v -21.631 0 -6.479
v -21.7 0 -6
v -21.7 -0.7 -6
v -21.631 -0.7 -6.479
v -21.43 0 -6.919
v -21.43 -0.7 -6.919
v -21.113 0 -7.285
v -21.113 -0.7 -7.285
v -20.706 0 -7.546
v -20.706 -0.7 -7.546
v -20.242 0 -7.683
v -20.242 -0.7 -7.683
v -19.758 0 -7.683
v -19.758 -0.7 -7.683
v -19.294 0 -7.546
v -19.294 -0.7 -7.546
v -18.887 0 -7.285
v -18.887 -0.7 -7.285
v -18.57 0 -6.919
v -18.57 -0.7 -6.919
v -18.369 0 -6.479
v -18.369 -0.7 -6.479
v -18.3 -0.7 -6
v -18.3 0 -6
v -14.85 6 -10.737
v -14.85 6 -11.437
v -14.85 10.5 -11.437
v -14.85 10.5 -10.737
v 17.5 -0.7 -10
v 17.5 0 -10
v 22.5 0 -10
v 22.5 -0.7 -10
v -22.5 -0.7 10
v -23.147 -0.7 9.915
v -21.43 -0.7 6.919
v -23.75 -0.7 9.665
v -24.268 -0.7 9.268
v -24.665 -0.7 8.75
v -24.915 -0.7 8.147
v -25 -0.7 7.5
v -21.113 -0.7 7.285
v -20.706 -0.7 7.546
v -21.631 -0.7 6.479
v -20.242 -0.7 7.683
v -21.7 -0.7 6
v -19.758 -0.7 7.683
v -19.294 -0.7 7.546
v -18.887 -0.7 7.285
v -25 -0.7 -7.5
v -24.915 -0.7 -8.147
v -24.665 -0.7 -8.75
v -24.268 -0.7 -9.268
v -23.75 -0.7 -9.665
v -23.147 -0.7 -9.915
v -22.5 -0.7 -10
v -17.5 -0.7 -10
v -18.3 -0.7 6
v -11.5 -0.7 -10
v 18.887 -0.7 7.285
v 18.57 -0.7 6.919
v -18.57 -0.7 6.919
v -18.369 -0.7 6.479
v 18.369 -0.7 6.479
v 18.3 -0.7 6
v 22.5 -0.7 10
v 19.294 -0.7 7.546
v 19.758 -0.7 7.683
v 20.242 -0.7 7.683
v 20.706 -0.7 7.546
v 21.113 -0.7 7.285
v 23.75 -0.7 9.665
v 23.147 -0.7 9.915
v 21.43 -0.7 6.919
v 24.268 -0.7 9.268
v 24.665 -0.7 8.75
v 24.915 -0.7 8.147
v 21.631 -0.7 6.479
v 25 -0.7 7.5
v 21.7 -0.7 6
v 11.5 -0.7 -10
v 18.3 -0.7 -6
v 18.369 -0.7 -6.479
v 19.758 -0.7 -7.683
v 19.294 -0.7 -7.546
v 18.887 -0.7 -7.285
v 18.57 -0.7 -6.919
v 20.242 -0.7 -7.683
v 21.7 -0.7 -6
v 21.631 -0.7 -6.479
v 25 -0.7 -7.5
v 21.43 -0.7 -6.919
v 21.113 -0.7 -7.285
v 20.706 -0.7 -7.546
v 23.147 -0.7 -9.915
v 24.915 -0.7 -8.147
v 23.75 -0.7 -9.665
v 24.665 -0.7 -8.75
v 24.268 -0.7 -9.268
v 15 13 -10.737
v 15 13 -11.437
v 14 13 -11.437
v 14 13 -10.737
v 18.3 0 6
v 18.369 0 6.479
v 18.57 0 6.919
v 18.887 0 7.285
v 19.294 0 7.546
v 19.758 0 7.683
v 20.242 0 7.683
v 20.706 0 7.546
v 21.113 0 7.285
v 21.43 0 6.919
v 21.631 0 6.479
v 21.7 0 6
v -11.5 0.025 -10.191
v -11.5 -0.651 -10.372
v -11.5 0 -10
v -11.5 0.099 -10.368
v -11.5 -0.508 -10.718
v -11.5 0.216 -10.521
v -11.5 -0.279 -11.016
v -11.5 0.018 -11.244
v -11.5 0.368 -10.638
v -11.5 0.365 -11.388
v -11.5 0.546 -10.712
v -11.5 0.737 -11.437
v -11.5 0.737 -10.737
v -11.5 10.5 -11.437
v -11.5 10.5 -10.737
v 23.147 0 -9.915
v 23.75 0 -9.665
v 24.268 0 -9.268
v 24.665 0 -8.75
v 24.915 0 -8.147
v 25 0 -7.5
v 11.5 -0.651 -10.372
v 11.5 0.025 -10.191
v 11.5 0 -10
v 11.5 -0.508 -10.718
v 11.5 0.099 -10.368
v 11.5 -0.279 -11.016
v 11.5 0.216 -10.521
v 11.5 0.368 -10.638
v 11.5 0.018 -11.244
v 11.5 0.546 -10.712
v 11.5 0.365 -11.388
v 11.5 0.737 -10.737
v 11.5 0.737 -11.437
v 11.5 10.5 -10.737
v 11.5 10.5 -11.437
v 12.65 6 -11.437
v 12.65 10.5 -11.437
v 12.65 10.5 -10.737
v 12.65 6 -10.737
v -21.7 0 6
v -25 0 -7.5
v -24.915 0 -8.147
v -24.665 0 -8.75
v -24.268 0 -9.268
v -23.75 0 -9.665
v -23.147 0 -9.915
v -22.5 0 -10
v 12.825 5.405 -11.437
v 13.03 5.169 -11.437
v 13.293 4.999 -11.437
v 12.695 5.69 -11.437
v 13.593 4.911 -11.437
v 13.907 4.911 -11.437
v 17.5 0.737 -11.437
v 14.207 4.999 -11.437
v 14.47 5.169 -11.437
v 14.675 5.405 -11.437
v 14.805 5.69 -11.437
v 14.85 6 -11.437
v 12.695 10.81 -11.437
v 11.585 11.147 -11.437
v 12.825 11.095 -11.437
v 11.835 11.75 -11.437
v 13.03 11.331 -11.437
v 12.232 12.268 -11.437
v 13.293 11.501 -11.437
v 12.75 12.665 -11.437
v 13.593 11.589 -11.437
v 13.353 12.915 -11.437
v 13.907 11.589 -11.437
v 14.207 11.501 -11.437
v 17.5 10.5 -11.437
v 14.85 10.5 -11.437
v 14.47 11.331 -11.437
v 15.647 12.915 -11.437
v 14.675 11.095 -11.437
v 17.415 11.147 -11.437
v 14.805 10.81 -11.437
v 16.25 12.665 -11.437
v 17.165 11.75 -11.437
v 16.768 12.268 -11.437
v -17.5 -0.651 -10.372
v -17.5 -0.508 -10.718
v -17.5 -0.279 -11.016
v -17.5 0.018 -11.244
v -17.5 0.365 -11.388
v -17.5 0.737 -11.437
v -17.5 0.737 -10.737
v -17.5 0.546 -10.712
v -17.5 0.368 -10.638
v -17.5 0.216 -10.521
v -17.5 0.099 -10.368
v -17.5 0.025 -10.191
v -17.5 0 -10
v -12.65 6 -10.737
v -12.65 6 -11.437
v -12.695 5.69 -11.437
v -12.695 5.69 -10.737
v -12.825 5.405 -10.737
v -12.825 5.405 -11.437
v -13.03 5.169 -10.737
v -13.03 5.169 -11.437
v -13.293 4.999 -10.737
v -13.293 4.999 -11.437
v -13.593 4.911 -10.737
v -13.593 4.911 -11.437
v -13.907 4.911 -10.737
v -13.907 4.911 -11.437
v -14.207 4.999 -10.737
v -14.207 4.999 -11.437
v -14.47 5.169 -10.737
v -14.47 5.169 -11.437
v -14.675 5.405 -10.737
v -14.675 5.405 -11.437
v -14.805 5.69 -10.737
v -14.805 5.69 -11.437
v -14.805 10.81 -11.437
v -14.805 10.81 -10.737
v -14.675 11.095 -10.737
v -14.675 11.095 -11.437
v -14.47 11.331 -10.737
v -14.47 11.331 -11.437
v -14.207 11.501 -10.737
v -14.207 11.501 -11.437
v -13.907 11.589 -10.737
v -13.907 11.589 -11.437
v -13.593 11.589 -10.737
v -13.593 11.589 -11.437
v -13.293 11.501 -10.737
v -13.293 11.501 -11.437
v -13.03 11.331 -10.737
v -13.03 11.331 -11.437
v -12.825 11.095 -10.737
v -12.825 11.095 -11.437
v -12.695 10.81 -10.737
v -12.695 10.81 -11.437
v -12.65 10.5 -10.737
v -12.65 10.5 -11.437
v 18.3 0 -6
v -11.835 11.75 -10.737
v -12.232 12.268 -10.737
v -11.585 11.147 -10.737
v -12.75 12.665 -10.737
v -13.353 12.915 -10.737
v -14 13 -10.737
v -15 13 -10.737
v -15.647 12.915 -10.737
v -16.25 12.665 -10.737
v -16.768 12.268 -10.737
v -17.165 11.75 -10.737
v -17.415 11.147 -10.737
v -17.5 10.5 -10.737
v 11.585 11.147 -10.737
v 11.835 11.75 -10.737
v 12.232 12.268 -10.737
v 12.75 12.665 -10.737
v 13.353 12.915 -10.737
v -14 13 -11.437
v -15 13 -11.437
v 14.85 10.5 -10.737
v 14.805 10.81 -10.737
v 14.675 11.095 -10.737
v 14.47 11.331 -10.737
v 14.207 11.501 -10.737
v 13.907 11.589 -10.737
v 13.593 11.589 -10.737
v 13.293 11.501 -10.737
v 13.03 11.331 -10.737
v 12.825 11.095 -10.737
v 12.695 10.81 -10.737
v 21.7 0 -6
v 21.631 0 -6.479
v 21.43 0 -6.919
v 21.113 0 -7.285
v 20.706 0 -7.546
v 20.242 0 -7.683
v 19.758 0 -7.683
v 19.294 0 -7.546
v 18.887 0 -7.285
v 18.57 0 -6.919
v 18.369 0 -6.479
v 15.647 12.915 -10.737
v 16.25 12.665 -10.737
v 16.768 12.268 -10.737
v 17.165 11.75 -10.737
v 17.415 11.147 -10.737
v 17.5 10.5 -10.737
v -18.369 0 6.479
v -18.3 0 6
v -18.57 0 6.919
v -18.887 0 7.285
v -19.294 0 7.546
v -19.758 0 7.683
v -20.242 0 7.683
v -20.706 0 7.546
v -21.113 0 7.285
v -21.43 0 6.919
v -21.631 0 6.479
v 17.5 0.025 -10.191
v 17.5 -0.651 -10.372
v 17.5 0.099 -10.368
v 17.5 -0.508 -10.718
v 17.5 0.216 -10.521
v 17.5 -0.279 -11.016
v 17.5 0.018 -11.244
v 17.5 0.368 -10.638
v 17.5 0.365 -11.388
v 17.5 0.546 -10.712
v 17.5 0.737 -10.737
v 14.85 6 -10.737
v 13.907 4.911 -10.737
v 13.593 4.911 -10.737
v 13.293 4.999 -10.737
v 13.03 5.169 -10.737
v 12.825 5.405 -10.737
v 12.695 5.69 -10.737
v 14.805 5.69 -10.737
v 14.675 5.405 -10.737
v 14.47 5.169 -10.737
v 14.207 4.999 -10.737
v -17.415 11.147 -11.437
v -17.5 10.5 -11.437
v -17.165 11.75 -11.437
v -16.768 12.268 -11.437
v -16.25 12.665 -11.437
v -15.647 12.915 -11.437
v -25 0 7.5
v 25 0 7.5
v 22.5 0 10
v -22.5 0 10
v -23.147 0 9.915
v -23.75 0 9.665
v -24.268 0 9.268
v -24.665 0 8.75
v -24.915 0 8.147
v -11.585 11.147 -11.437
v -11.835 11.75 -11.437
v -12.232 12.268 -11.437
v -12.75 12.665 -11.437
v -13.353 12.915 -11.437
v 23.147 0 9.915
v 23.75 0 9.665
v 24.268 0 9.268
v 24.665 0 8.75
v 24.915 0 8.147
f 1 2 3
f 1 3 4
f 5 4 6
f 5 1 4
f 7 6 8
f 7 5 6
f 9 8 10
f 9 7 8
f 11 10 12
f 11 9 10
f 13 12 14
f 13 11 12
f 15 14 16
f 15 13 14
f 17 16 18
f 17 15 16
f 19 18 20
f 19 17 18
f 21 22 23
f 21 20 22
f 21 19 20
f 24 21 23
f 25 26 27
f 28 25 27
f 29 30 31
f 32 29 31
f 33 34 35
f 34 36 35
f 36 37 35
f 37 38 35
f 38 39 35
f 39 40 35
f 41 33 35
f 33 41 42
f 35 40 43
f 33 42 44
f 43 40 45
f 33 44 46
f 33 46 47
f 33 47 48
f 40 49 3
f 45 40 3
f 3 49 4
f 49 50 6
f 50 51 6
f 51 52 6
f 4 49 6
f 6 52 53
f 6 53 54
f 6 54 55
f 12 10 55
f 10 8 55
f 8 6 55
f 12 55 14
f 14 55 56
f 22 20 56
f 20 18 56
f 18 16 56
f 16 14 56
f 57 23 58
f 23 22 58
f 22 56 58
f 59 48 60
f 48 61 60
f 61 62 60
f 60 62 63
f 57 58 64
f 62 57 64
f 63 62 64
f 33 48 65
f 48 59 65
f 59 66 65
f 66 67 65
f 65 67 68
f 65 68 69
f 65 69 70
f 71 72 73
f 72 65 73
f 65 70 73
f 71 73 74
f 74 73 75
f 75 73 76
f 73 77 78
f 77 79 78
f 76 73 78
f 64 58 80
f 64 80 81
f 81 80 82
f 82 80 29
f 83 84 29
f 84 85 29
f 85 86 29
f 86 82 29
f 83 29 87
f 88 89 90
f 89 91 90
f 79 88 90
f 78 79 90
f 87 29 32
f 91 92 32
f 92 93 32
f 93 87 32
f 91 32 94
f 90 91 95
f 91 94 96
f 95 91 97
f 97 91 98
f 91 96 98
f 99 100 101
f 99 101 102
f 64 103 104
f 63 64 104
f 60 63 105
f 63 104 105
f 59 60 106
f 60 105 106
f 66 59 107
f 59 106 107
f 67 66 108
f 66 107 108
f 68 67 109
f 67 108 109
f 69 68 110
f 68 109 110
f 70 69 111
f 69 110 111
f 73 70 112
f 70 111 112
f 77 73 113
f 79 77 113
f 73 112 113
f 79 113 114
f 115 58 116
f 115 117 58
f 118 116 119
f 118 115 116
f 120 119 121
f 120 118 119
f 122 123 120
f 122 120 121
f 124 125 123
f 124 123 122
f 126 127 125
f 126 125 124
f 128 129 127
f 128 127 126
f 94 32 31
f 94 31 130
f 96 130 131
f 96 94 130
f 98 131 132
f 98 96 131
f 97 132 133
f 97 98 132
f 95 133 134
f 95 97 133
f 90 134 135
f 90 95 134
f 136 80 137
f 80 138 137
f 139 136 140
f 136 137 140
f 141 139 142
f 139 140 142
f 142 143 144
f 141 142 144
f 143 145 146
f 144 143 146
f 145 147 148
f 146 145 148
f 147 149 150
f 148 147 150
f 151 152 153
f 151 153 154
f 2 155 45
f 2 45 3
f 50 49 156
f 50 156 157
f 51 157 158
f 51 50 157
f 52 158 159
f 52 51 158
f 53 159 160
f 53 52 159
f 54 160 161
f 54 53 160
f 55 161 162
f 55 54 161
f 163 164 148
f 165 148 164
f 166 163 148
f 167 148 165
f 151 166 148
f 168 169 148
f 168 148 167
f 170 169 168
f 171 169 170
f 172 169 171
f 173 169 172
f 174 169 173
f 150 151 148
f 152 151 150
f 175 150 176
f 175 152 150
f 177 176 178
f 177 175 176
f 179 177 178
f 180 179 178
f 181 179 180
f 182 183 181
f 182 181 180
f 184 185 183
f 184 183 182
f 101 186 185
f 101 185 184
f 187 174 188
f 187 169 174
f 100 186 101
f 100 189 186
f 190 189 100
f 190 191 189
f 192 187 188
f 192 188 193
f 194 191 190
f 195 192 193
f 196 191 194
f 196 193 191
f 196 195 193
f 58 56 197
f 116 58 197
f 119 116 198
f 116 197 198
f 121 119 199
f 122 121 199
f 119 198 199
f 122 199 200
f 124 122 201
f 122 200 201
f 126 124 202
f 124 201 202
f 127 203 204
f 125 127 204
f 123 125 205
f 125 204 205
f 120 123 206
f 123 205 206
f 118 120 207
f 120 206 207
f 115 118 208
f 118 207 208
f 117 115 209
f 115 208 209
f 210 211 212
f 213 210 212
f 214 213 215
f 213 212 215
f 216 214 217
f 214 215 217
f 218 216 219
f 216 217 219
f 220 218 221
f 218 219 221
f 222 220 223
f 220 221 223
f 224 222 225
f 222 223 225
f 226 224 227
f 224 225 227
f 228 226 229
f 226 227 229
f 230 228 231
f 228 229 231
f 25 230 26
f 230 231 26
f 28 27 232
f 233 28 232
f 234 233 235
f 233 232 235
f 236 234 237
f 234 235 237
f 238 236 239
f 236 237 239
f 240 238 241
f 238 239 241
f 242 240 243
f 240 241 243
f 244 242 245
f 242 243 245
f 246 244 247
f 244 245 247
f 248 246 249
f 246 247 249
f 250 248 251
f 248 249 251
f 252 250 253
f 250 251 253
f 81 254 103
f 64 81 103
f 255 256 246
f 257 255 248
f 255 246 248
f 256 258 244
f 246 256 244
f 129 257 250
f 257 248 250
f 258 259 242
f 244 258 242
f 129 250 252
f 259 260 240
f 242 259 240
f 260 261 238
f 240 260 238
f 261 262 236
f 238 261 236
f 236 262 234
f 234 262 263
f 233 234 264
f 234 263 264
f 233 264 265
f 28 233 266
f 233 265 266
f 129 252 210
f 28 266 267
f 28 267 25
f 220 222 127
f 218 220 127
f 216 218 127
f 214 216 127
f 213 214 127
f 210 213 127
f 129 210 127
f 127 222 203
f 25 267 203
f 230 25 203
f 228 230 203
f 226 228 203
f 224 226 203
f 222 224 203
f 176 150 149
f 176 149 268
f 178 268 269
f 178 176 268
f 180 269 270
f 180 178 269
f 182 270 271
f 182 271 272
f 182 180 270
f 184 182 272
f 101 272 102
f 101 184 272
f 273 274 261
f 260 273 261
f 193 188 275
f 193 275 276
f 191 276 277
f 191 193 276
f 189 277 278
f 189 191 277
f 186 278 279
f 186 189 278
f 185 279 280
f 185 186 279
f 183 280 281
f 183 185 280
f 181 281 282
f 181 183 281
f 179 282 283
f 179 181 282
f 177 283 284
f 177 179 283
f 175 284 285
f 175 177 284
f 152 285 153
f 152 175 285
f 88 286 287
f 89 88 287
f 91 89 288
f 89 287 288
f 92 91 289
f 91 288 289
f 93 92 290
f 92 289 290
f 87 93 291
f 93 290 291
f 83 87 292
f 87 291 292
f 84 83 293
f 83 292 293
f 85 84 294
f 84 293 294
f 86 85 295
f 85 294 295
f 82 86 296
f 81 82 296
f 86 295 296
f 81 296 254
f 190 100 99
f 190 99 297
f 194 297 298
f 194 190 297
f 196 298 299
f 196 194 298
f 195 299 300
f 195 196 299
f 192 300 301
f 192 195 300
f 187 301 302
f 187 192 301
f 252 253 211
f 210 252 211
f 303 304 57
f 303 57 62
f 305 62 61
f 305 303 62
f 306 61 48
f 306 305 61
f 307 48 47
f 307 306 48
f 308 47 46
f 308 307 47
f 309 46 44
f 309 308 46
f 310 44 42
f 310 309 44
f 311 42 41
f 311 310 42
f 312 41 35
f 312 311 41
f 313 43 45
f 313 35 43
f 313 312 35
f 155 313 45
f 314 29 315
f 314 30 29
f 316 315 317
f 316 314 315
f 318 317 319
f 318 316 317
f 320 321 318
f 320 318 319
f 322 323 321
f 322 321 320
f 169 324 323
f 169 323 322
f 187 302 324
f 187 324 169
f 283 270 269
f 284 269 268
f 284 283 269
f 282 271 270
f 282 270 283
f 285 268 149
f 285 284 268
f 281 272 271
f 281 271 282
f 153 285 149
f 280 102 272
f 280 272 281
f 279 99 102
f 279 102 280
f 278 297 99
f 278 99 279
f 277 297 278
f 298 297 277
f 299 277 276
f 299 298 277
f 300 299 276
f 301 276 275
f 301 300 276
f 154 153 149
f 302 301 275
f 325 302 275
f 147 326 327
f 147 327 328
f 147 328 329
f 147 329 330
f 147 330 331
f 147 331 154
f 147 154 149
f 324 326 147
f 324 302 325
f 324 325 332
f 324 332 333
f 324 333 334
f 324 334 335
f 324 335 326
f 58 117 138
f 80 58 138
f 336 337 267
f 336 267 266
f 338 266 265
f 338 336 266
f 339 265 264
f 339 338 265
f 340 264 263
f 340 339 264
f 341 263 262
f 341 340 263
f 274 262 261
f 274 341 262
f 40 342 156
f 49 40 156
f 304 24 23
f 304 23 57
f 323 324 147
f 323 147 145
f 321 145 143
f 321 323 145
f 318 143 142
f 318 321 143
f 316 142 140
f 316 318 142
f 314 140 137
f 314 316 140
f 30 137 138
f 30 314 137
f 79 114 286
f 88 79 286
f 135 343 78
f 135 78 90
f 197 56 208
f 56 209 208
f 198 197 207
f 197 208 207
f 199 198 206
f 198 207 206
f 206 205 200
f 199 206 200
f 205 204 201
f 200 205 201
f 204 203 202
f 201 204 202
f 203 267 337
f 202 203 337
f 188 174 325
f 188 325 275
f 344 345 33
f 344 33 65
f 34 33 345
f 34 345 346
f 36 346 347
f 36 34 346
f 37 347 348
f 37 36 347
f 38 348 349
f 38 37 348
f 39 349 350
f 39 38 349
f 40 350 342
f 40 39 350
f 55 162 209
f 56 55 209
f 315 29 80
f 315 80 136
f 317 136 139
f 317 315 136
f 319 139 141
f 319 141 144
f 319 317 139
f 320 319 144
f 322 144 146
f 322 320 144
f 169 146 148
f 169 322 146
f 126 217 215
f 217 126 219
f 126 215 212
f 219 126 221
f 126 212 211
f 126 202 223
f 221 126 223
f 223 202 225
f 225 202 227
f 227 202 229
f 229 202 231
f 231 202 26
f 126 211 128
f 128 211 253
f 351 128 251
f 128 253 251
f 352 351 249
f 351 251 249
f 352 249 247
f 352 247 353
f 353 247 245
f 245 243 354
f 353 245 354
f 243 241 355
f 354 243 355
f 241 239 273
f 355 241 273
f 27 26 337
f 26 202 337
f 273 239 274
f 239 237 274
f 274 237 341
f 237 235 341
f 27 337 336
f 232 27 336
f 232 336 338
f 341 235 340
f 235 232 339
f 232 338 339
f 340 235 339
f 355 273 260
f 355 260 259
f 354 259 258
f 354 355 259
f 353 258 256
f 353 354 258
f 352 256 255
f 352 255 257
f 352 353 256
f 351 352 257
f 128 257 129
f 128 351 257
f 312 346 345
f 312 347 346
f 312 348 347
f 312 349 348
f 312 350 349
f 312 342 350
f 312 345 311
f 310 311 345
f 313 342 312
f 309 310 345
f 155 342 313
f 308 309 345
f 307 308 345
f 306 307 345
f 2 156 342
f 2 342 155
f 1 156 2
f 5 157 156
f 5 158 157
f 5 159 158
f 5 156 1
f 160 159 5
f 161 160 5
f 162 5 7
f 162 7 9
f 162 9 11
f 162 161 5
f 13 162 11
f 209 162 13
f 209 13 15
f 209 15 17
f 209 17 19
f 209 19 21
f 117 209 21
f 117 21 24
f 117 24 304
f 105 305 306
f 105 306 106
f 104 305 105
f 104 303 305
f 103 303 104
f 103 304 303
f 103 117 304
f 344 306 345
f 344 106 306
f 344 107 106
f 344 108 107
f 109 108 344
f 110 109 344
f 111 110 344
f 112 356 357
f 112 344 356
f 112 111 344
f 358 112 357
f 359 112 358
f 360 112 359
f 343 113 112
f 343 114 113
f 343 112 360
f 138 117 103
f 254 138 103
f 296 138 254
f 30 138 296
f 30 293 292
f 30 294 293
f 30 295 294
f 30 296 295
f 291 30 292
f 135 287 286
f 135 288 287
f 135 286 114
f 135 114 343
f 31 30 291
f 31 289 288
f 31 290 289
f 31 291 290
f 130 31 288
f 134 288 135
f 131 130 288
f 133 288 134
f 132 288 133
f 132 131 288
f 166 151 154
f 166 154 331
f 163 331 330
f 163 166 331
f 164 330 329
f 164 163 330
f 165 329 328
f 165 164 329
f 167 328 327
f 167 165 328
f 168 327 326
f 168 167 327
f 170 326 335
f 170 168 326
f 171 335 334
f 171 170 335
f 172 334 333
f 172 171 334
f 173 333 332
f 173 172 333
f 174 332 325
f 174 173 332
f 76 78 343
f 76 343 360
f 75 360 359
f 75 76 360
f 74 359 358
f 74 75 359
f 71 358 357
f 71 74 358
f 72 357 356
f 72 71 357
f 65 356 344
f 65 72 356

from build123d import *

# Parameters (mm, degrees)
SKETCH1_W             = 50
SKETCH1_H             = 20
BASE_FLANGE1_DEPTH    = 0.7
EDGE_FLANGE1_DEPTH    = 6
CUT_EXTRUDE1_REACH    = 37.405
BREAK_CORNER1_START   = -12
BREAK_CORNER1_DEPTH   = 2
BREAK_CORNER1_START_2 = -2
BREAK_CORNER1_2_DEPTH = 3
CUT_EXTRUDE2_REACH    = 32.41


with BuildPart() as part:
    # Base-Flange1: sheet metal written as solids
    # Sketch1 → Base-Flange1 (new body)
    with BuildSketch(Plane(origin=(0, 0, 0), x_dir=(1, 0, 0), z_dir=(0, 1, 0))):
        Rectangle(SKETCH1_W, SKETCH1_H)
    extrude(amount=-BASE_FLANGE1_DEPTH)

    # Edge-Flange1: sheet metal written as solids
    # Edge-Flange1 section (on a plane across the edge) → Edge-Flange1 (add)
    with BuildSketch(Plane(origin=(17.5, 0, -10.7366), x_dir=(0, 0, 1), z_dir=(-1, 0, 0))):
        with BuildLine():
            Line((-0.7, 0.7366), (-0.7, 13))
            Line((-0.7, 13), (0, 13))
            Line((0, 13), (0, 0.7366))
            ThreePointArc((0, 0.7366), (0.215745145, 0.215745145), (0.7366, 0))
            Line((0.7366, 0), (0.7366, -0.7))
            ThreePointArc((0.7366, -0.7), (-0.279229602, -0.279229602), (-0.7, 0.7366))
        make_face()
    edge_flange1 = extrude(amount=EDGE_FLANGE1_DEPTH)

    # Sketch7 → Cut-Extrude1 (cut, up to next)
    with BuildSketch(Plane(origin=(0, 0, -11.4366), x_dir=(-1, 0, 0), z_dir=(0, 0, -1)), mode=Mode.PRIVATE) as cut_extrude1_sk1:
        with BuildLine():
            Line((-12.65, 10.5), (-12.65, 6))
            ThreePointArc((-12.65, 6), (-13.75, 4.9), (-14.85, 6))
            Line((-14.85, 6), (-14.85, 10.5))
            ThreePointArc((-14.85, 10.5), (-13.75, 11.6), (-12.65, 10.5))
        make_face()
    cut_extrude1_tool1 = extrude(cut_extrude1_sk1.sketch, amount=-CUT_EXTRUDE1_REACH, mode=Mode.PRIVATE) & part.part
    cut_extrude1 = cut_extrude1_tool1.solids().sort_by_distance((13.75, 8.25, -11.4366))[0]
    add(cut_extrude1, mode=Mode.SUBTRACT)

    # Mirror1: Edge-Flange1, Cut-Extrude1 across plane
    add(edge_flange1.mirror(Plane(origin=(0, 0, 0), x_dir=(0, 0, 1), z_dir=(1, 0, 0))))
    add(cut_extrude1.mirror(Plane(origin=(0, 0, 0), x_dir=(0, 0, 1), z_dir=(1, 0, 0))), mode=Mode.SUBTRACT)

    # Break-Corner1: read off the stored shape, not the designer's step
    # Break-Corner1 outline → Break-Corner1 (cut)
    with BuildSketch(Plane.XY.offset(BREAK_CORNER1_START)):
        with BuildLine():
            ThreePointArc((-17.5, 10.5), (-16.767766953, 12.267766953), (-15, 13))
            Line((-15, 13), (-17.5, 13))
            Line((-17.5, 13), (-17.5, 10.5))
        make_face()
        with BuildLine():
            ThreePointArc((-14, 13), (-12.232233047, 12.267766953), (-11.5, 10.5))
            Line((-11.5, 10.5), (-11.5, 13))
            Line((-11.5, 13), (-14, 13))
        make_face()
        with BuildLine():
            ThreePointArc((11.5, 10.5), (12.232233047, 12.267766953), (14, 13))
            Line((14, 13), (11.5, 13))
            Line((11.5, 13), (11.5, 10.5))
        make_face()
        with BuildLine():
            ThreePointArc((15, 13), (16.767766953, 12.267766953), (17.5, 10.5))
            Line((17.5, 10.5), (17.5, 13))
            Line((17.5, 13), (15, 13))
        make_face()
    extrude(amount=BREAK_CORNER1_DEPTH, mode=Mode.SUBTRACT)

    # Break-Corner1 2 outline → Break-Corner1 2 (cut)
    with BuildSketch(Plane(origin=(0, 0, 0), x_dir=(1, 0, 0), z_dir=(0, 1, 0)).offset(BREAK_CORNER1_START_2)):
        with BuildLine():
            ThreePointArc((22.5, 10), (24.267766953, 9.267766953), (25, 7.5))
            Line((25, 7.5), (25, 10))
            Line((25, 10), (22.5, 10))
        make_face()
        with BuildLine():
            Line((-25, 10), (-25, 7.5))
            ThreePointArc((-25, 7.5), (-24.267766953, 9.267766953), (-22.5, 10))
            Line((-22.5, 10), (-25, 10))
        make_face()
        with BuildLine():
            Line((-25, -10), (-22.5, -10))
            ThreePointArc((-22.5, -10), (-24.267766953, -9.267766953), (-25, -7.5))
            Line((-25, -7.5), (-25, -10))
        make_face()
        with BuildLine():
            ThreePointArc((25, -7.5), (24.267766953, -9.267766953), (22.5, -10))
            Line((22.5, -10), (25, -10))
            Line((25, -10), (25, -7.5))
        make_face()
    extrude(amount=BREAK_CORNER1_2_DEPTH, mode=Mode.SUBTRACT)

    # Sketch8 → Cut-Extrude2 (cut, up to next)
    with BuildSketch(Plane(origin=(0, 0, 0), x_dir=(1, 0, 0), z_dir=(0, 1, 0)), mode=Mode.PRIVATE) as cut_extrude2_sk1:
        with BuildLine():
            Line((-18.3, 6), (-18.3, -6))
            ThreePointArc((-18.3, -6), (-20, -7.7), (-21.7, -6))
            Line((-21.7, -6), (-21.7, 6))
            ThreePointArc((-21.7, 6), (-20, 7.7), (-18.3, 6))
        make_face()
    cut_extrude2_tool1 = extrude(cut_extrude2_sk1.sketch, amount=-CUT_EXTRUDE2_REACH, mode=Mode.PRIVATE) & part.part
    # Sketch8 → Cut-Extrude2 (cut, up to next)
    with BuildSketch(Plane(origin=(0, 0, 0), x_dir=(1, 0, 0), z_dir=(0, 1, 0)), mode=Mode.PRIVATE) as cut_extrude2_sk2:
        with BuildLine():
            Line((18.3, 6), (18.3, -6))
            ThreePointArc((18.3, -6), (20, -7.7), (21.7, -6))
            Line((21.7, -6), (21.7, 6))
            ThreePointArc((21.7, 6), (20, 7.7), (18.3, 6))
        make_face()
    cut_extrude2_tool2 = extrude(cut_extrude2_sk2.sketch, amount=-CUT_EXTRUDE2_REACH, mode=Mode.PRIVATE) & part.part
    add(cut_extrude2_tool1.solids().sort_by_distance((-20, 0, 0))[0], mode=Mode.SUBTRACT)
    add(cut_extrude2_tool2.solids().sort_by_distance((20, 0, 0))[0], mode=Mode.SUBTRACT)


solid = part.part
